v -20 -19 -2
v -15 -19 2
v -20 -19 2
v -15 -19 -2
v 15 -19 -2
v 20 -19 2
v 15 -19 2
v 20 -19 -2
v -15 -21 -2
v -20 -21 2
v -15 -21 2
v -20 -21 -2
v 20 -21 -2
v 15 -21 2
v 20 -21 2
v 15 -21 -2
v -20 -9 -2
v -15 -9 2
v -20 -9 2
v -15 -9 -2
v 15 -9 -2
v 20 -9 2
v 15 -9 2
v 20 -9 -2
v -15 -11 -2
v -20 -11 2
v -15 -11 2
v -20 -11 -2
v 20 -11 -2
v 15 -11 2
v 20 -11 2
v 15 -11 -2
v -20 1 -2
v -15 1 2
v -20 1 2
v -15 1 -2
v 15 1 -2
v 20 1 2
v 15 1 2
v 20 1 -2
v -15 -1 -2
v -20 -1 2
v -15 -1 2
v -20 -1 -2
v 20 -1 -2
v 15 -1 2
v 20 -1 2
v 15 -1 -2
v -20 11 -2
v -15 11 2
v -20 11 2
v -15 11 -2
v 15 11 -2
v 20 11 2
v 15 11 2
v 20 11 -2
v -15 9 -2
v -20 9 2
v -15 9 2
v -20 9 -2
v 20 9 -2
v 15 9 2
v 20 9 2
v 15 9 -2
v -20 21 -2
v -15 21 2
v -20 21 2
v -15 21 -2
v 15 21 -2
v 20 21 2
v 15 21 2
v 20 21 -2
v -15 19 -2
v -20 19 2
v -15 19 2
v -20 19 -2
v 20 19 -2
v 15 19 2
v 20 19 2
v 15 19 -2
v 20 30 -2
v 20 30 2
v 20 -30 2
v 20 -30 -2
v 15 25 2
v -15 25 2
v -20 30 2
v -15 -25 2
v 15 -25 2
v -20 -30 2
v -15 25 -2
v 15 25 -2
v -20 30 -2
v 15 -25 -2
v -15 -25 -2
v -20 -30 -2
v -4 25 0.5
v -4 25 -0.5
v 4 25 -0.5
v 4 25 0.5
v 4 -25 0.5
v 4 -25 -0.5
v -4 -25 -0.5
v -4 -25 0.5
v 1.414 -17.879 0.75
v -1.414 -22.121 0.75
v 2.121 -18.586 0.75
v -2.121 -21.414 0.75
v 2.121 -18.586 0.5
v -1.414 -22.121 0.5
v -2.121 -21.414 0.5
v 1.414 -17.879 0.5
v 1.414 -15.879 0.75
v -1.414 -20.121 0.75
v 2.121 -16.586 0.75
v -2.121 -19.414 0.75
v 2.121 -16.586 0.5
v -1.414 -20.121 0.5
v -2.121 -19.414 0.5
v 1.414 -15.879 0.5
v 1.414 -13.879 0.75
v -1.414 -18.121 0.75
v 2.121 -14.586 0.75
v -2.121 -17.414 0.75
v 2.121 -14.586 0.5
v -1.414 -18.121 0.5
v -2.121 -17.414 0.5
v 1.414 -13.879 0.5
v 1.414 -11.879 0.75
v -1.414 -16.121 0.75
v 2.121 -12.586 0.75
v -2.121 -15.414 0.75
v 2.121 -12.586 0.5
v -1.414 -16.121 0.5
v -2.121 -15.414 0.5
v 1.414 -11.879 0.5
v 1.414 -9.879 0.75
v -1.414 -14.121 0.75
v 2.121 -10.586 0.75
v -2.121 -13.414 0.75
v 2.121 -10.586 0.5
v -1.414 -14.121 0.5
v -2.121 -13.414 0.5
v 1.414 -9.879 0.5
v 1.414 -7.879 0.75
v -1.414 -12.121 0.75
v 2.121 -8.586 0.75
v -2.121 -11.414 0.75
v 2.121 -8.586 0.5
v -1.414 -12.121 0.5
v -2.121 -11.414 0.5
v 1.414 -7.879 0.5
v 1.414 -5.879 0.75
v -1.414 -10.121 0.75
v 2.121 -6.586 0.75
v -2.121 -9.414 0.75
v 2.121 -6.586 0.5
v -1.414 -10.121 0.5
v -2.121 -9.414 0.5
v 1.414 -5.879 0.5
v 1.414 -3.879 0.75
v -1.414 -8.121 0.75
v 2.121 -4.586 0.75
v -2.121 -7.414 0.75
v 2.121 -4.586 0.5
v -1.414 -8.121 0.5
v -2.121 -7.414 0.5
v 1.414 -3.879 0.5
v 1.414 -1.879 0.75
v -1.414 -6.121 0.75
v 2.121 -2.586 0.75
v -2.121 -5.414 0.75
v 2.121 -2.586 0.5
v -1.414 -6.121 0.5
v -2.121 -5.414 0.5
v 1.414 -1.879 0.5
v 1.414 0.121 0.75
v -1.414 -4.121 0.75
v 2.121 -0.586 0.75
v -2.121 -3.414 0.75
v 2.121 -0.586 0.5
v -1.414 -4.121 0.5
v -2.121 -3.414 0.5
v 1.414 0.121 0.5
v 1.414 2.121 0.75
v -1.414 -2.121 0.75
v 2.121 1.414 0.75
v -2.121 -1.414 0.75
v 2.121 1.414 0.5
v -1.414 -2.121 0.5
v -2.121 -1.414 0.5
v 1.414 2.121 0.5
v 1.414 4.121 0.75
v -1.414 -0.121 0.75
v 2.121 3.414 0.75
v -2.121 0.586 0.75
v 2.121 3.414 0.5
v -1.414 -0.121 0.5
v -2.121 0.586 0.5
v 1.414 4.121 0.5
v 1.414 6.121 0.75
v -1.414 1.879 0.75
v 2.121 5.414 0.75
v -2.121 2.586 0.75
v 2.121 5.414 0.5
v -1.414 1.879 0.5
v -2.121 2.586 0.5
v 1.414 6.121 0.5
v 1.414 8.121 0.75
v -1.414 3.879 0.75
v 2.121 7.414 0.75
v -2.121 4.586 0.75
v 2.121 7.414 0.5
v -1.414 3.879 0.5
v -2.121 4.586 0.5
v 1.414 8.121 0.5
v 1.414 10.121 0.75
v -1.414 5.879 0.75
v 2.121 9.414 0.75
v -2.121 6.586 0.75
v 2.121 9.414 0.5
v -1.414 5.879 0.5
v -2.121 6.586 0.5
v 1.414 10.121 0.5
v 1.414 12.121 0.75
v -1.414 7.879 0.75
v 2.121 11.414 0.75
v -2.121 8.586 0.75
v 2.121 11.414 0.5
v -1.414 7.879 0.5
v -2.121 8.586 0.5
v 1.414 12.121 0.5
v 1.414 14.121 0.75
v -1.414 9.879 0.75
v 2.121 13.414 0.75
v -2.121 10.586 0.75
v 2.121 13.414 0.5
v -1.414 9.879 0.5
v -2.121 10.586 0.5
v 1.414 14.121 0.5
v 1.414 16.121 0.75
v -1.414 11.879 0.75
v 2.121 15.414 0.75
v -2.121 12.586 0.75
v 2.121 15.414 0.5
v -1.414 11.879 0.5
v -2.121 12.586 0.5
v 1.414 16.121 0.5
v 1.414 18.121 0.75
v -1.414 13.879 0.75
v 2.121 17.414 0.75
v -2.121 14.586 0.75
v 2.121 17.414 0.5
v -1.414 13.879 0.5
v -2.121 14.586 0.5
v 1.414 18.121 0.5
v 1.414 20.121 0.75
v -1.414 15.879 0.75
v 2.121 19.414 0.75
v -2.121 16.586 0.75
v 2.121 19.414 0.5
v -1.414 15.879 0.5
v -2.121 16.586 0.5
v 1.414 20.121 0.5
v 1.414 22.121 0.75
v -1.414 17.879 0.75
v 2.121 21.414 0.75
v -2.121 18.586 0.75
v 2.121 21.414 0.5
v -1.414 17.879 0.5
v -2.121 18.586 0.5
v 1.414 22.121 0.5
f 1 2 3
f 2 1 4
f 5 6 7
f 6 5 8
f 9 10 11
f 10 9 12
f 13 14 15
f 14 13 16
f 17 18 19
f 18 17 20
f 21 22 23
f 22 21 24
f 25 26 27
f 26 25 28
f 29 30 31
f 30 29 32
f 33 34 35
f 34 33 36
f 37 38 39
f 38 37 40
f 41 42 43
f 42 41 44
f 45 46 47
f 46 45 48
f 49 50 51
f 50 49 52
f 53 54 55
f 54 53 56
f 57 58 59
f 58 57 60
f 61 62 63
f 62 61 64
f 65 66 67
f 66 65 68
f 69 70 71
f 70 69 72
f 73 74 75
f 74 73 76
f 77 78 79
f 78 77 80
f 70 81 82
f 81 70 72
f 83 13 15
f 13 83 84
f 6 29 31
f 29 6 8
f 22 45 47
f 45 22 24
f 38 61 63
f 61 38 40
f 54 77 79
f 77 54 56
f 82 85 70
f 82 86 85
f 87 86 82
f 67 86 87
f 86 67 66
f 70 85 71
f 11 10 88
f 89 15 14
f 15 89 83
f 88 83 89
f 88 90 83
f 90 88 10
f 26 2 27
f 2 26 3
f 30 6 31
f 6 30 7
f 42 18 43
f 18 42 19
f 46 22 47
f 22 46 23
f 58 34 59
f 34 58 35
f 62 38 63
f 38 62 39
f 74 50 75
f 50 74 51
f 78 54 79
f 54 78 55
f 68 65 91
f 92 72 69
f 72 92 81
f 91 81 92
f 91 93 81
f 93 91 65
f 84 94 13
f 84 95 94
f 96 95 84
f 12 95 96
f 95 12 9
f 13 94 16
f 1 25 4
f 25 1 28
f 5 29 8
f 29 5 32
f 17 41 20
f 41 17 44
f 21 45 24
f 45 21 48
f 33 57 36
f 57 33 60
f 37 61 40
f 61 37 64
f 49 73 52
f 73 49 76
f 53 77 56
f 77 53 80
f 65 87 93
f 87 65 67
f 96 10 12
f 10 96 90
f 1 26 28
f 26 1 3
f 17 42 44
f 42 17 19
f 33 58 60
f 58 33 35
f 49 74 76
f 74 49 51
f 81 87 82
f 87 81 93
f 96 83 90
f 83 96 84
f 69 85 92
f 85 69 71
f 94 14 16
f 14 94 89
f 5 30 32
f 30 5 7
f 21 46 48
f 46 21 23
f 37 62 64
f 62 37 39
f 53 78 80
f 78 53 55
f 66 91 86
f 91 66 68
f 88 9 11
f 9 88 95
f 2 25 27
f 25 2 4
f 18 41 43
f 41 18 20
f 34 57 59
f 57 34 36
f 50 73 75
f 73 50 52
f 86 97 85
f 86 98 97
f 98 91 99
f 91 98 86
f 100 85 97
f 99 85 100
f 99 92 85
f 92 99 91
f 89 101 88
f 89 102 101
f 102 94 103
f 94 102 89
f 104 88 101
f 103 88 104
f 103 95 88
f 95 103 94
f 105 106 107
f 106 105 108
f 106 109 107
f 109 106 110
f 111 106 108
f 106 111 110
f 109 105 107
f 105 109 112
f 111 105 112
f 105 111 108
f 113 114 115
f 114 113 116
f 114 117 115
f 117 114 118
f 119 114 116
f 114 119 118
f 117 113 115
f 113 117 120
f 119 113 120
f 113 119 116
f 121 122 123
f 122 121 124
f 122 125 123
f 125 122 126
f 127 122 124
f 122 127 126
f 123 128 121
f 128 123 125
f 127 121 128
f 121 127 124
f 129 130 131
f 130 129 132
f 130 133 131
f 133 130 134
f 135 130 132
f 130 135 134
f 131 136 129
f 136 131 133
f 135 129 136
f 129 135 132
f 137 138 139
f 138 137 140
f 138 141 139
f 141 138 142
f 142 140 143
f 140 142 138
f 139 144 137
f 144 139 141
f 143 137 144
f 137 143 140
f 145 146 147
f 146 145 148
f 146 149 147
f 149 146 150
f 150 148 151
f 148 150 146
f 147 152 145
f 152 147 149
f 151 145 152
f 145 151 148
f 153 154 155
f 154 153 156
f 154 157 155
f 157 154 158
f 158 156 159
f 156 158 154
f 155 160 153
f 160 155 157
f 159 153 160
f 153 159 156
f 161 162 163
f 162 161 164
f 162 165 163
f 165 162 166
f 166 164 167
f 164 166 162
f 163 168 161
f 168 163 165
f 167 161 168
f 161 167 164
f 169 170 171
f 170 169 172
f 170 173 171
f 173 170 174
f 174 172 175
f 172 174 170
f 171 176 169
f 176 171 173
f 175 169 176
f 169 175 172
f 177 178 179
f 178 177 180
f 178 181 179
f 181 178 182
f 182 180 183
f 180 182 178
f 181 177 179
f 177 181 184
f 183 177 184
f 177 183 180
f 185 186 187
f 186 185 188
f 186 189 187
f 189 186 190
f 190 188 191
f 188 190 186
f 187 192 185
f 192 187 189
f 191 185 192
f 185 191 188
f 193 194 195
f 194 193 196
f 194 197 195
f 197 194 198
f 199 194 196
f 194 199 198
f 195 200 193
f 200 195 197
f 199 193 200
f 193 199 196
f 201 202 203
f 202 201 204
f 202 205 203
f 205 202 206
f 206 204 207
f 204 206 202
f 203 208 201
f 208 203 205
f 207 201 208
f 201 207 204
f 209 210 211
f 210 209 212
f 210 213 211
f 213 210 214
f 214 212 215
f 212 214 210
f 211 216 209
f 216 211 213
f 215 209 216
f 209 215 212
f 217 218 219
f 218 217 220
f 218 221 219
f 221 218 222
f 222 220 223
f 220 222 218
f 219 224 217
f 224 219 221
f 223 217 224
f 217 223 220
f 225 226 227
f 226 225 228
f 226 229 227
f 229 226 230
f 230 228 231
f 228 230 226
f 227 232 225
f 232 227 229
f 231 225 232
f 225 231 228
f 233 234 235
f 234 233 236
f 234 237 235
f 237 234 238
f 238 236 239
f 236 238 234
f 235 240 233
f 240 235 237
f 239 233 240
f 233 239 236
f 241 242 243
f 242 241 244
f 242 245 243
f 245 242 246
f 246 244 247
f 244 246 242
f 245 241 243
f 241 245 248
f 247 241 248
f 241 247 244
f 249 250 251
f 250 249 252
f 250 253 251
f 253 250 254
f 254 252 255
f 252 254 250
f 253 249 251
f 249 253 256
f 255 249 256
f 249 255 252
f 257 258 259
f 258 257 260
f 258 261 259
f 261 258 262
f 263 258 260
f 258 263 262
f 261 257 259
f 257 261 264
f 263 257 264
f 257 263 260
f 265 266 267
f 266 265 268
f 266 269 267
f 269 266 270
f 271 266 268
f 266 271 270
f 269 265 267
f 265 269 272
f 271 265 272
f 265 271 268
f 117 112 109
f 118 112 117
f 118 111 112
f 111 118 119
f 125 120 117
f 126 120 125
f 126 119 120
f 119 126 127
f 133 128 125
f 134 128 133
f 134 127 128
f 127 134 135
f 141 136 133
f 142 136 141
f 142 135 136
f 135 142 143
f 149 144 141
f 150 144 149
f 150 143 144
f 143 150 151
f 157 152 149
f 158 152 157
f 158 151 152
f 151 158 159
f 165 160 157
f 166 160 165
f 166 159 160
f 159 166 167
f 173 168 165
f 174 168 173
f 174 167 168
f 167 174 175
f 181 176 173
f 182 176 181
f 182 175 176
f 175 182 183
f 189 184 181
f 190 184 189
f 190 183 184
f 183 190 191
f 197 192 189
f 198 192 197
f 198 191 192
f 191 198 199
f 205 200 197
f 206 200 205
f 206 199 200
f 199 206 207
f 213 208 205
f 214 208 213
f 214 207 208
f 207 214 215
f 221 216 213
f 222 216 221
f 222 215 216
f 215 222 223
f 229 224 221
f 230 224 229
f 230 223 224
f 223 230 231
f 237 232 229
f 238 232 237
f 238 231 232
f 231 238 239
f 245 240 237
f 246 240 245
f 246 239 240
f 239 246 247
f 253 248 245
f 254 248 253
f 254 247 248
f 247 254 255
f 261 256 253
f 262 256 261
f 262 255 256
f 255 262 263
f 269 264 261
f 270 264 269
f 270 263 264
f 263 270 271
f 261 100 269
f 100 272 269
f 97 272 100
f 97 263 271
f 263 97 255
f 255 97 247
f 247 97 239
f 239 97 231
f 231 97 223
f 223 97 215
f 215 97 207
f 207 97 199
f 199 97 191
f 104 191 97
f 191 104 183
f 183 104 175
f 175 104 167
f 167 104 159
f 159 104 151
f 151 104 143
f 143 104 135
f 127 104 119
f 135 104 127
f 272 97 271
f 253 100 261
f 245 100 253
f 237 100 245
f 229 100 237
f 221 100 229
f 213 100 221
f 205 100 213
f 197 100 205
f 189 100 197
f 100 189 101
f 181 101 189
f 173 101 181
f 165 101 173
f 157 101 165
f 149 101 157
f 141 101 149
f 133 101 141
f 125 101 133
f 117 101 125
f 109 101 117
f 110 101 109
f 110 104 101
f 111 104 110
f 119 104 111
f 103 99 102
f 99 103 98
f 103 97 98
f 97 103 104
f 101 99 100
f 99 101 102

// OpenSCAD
/* KOKOMO ART ASSOCIATION - GENERATIVE OBJECTS
   Generated: 2026-02-13
   Design ID: 22
   
   INSTRUCTIONS:
   1. Save as "kaa_design.scad"
   2. Ensure "logo.svg" is in the same folder (if using logo)
   3. Open in OpenSCAD -> F6 -> Export STL
*/

// --- USER CONFIGURATION ---
design_id = 22;
top_text = "KOKOMO ART ASSOCIATION";
bottom_text = "kaaonline.org";
use_logo = false;
logo_file = "logo.svg";

// [POCKET ORBIT CONFIG]
// 0 = River-Stone Minimal | 1 = Art Deco Notchwork | 2 = Bloom Drift
design_style = 1; 
render_mode = "assembled"; // "assembled" or "knolled"

// --- GLOBAL PARAMETERS ---
card_width = 85;
card_length = 55;
corner_radius = 3;
tol = 0.4; // Tolerance
$fn = 60;  // Resolution

// --- SHARED MODULES ---

module card_base(thickness) {
    hull() {
        translate([corner_radius, corner_radius, 0]) cylinder(r=corner_radius, h=thickness);
        translate([card_width-corner_radius, corner_radius, 0]) cylinder(r=corner_radius, h=thickness);
        translate([card_width-corner_radius, card_length-corner_radius, 0]) cylinder(r=corner_radius, h=thickness);
        translate([corner_radius, card_length-corner_radius, 0]) cylinder(r=corner_radius, h=thickness);
    }
}

module rounded_square(w, l, r) {
    hull() {
        translate([r, r]) circle(r=r);
        translate([w-r, r]) circle(r=r);
        translate([w-r, l-r]) circle(r=r);
        translate([r, l-r]) circle(r=r);
    }
}

module branding_text(thickness) {
    if (top_text != "") {
        translate([card_width/2, card_length - 8, thickness - 0.4])
            linear_extrude(0.8) text(top_text, size=4, halign="center", valign="center", font="Arial:style=Bold");
    }
    if (bottom_text != "") {
        translate([card_width/2, 8, thickness - 0.4])
            linear_extrude(0.8) text(bottom_text, size=3, halign="center", valign="center", font="Arial");
    }
}

module place_logo(thickness) {
    if (use_logo) {
        translate([card_width/2, card_length/2, thickness - 0.6])
            linear_extrude(1.0)
            scale([0.3, 0.3, 1]) 
            import(logo_file, center=true);
    }
}

module v_track_cutout(x_start, y_center, x_len, y_width, z_thick) {
    translate([x_start, y_center, 0])
    hull() {
        translate([0, -y_width/2, -0.1]) cube([x_len, y_width, 0.1]);
        translate([0, -(y_width + 2)/2, z_thick/2 - 0.1]) cube([x_len, y_width + 2, 0.2]);
        translate([0, -y_width/2, z_thick]) cube([x_len, y_width, 0.1]);
    }
}

module v_track_slider(x_start, y_center, x_len, y_width, z_thick) {
    w1 = y_width - (2 * tol);
    w2 = (y_width + 2) - (2 * tol);
    translate([x_start, y_center, 0])
    hull() {
        translate([0, -w1/2, 0]) cube([x_len, w1, 0.1]);
        translate([0, -w2/2, z_thick/2 - 0.1]) cube([x_len, w2, 0.2]);
        translate([0, -w1/2, z_thick - 0.1]) cube([x_len, w1, 0.1]);
    }
}

// --- CARD DESIGNS (1-14) ---

module pulse_dots() {
    th = 0.8;
    difference() {
        card_base(th);
        if (top_text != "") translate([10, card_length-12, -1]) cube([65, 10, th+2]);
        if (bottom_text != "") translate([10, 2, -1]) cube([65, 10, th+2]);
    }
    branding_text(th);
    place_logo(th);
    for (x = [4 : 3.5 : card_width-4]) {
        for (y = [12 : 3.5 : card_length-12]) {
            h_add = 0.6 + (0.4 * sin(x*25)) + (0.3 * cos(y*30));
            translate([x, y, th - 0.2]) scale([1, 1, h_add/1.5]) sphere(r=1.5, $fn=20);
        }
    }
}

module breathe_lines() {
    th = 0.8;
    card_base(th);
    branding_text(th);
    intersection() {
        translate([0,0,th]) linear_extrude(2) rounded_square(card_width, card_length, corner_radius);
        union() {
            for (x = [6 : 4 : card_width-4]) {
                translate([x, 0, th]) rotate([-90, 0, 0]) scale([1, 0.6, 1]) cylinder(r=2, h=card_length);
            }
        }
    }
}

module micro_labyrinth() {
    th = 0.8;
    card_base(th);
    branding_text(th);
    path_width = 1.5; wall_thick = 1.5;
    intersection() {
        translate([0,0,th]) linear_extrude(2) rounded_square(card_width, card_length, corner_radius);
        union() {
            for (i = [0 : 4]) {
                w = card_width - 12 - (i * (path_width + wall_thick)*2);
                l = card_length - 12 - (i * (path_width + wall_thick)*2);
                if (w > 10 && l > 10) {
                    difference() {
                        translate([card_width/2, card_length/2, th])
                            linear_extrude(1.2)
                            difference() {
                                rounded_square(w, l, 3);
                                translate([wall_thick, wall_thick, 0]) rounded_square(w-wall_thick*2, l-wall_thick*2, 1.5);
                            }
                        translate([card_width/2 + (i%2==0 ? w/3 : -w/3), card_length/2 + (i%2==0 ? l/2 : -l/2), th])
                            cube([6, 6, 5], center=true);
                    }
                }
            }
        }
    }
}

module quiet_tile() {
    th = 1.2;
    difference() {
        card_base(th);
        translate([card_width*0.75 - 13, card_length/2 - 13, -1]) linear_extrude(4) rounded_square(26, 26, 3);
    }
    branding_text(th);
    translate([card_width*0.75, card_length + 20, 0]) {
        difference() {
            translate([-12.5, -12.5, 0]) linear_extrude(2.5) rounded_square(25, 25, 2.5);
            translate([0, 0, 11]) sphere(r=9.5, $fn=100);
        }
    }
}

module orbit_slider() {
    th = 1.6;
    center_x = card_width * 0.75; center_y = card_length / 2; radius = 16; track_w = 4.5;
    difference() {
        card_base(th);
        translate([center_x, center_y, th/2])
            rotate_extrude()
                polygon(points=[[radius - track_w, -th/2 - 0.1], [radius, -th/2 - 0.1], [radius + 1.2, 0], [radius, th/2 + 0.1], [radius - track_w, th/2 + 0.1]]);
    }
    branding_text(th);
    translate([center_x, center_y, th/2])
        rotate_extrude()
            polygon(points=[[radius - track_w + tol, -th/2 + tol], [radius - tol, -th/2 + tol], [radius + 1.2 - tol*1.5, 0], [radius - tol, th/2 - tol], [radius - track_w + tol, th/2 - tol]]);
}

module viewfinder() {
    th = 1.2;
    difference() {
        card_base(th);
        translate([(card_width - 50)/2, (card_length - 31)/2, -1])
            hull() { r=2; translate([r,r,0]) cylinder(r=r,h=th+2); translate([50-r,r,0]) cylinder(r=r,h=th+2); translate([50-r,31-r,0]) cylinder(r=r,h=th+2); translate([r,31-r,0]) cylinder(r=r,h=th+2); }
        translate([card_width - 6, card_length - 6, -1]) cylinder(r=2, h=th+2);
    }
    branding_text(th);
}

module curator_gauge() {
    th = 1.2;
    difference() {
        card_base(th);
        translate([10, -1, -1]) cube([5, 12, th+2]);
        translate([25, -1, -1]) cube([10, 15, th+2]);
        translate([45, -1, -1]) cube([15, 18, th+2]);
        translate([70, -1, -1]) cube([20, 20, th+2]);
        for (i = [0 : 80]) {
            tl = (i % 10 == 0) ? 4 : ((i % 5 == 0) ? 2.5 : 1.5);
            tw = (i % 10 == 0) ? 0.6 : 0.4;
            translate([2.5 + i, card_length - tl, th - 0.4]) cube([tw, tl + 1, 1]);
        }
    }
    branding_text(th);
}

module french_curve() {
    th = 1.2;
    difference() {
        hull() {
            translate([corner_radius, corner_radius, 0]) cylinder(r=corner_radius, h=th);
            translate([card_width-corner_radius, corner_radius, 0]) cylinder(r=corner_radius, h=th);
            translate([corner_radius, card_length - 15, 0]) cylinder(r=corner_radius, h=th);
            translate([card_width*0.3, card_length - 5, 0]) cylinder(r=15, h=th);
            translate([card_width*0.7, card_length - 25, 0]) cylinder(r=8, h=th);
            translate([card_width-corner_radius, corner_radius*3, 0]) cylinder(r=corner_radius, h=th);
        }
        translate([20, 20, -1]) cylinder(r=7.5, h=th+2);
        translate([38, 14, -1]) hull() { r=1; translate([r,r,0]) cylinder(r=r,h=th+2); translate([12-r,12-r,0]) cylinder(r=r,h=th+2); } 
    }
    branding_text(th);
}

module portfolio_clip() {
    th = 1.2;
    difference() {
        card_base(th);
        translate([15, 15, -1]) linear_extrude(th + 2) {
             hull() { translate([0, 0, 0]) circle(d=3); translate([55, 0, 0]) circle(d=3); }
             hull() { translate([55, 0, 0]) circle(d=3); translate([55, 25, 0]) circle(d=3); }
             hull() { translate([55, 25, 0]) circle(d=3); translate([5, 25, 0]) circle(d=3); }
             // Simplified loop for brevity
        }
    }
    branding_text(th);
}

module micro_easel() {
    th = 1.2; hinge = 0.4;
    difference() {
        card_base(th);
        translate([20, 10, -1]) linear_extrude(th + 2) polygon(points=[[0,0], [45,0], [45,30], [0,30]]);
        translate([20, 40, hinge]) cube([45, 1.5, th]);
    }
    branding_text(th);
}

module captive_slider() {
    th = 1.2;
    difference() {
        card_base(th);
        translate([15, 25, -1]) cube([55, 5, th + 2]);
        translate([12, 22.5, th/2 - 0.3]) cube([61, 10, 0.6]);
    }
    branding_text(th);
    translate([25, 25 + tol, 0]) cube([10, 5 - (tol*2), th]);
    translate([23, 23.5 + tol, th/2 - 0.15]) cube([14, 8 - (tol*2), 0.3]);
}

module aspect_cropper() {
    th = 2.0;
    difference() {
        card_base(th);
        translate([15, 18, -1]) cube([50, 30, th + 2]);
        v_track_cutout(12, 11, 56, 10, th);
    }
    branding_text(th);
    v_track_slider(14, 11, 12, 10, th);
    translate([20, 16, 0]) cube([6, 32, th]);
    translate([20, 42, 0]) cube([15, 6, th]);
}

module curator_selector() {
    th = 2.0;
    difference() {
        card_base(th);
        v_track_cutout(10, 27.5, 65, 18, th);
        translate([20, 27.5, th - 0.6]) linear_extrude(1) text("CREATE", size=4, halign="center", valign="center");
        translate([65, 27.5, th - 0.6]) linear_extrude(1) text("CONNECT", size=4, halign="center", valign="center");
    }
    branding_text(th);
    difference() {
        v_track_slider(12, 27.5, 22, 18, th);
        translate([20, 27.5, -1]) cylinder(r=5, h=th+2);
    }
}

module vault_doors() {
    th = 2.0;
    difference() {
        card_base(th);
        v_track_cutout(8, 27.5, 69, 25, th);
        translate([27.5, 15, 0.6]) cube([30, 25, th]);
    }
    branding_text(th);
    place_logo(th);
    difference() {
        v_track_slider(8, 27.5, 28, 25, th);
        translate([35, 27.5, -1]) cube([5, 10, th+2], center=true);
    }
    translate([12, 27.5, th/2]) scale([0.5, 1, 1]) sphere(r=5);
    union() {
        v_track_slider(49, 27.5, 28, 25, th);
        translate([47, 22.5, 0]) cube([3, 10, th - 0.2]); 
    }
    translate([73, 27.5, th/2]) scale([0.5, 1, 1]) sphere(r=5);
}

// --- POCKET ORBITS MODULES ---

module OrbitRingStack() {
    core_radius = 8; ring_thickness = 4; height = 12; tolerance = 0.4;
    module ring_shape(radius, w, h, style) {
        if (style == 0) { rotate_extrude() translate([radius + w/2, 0, 0]) resize([w, h]) circle(d=h); } 
        else if (style == 1) { 
            difference() {
                union() { cylinder(r=radius + w, h=h, center=true, $fn=80); for(i=[0:1]) translate([0,0,(i==0?1:-1)*(h/4)]) cylinder(r=radius + w + 0.5, h=1, center=true, $fn=80); }
                cylinder(r=radius, h=h+2, center=true, $fn=80);
                translate([0,0,h/2]) cylinder(r1=radius+w-1, r2=radius+w, h=1, center=false);
                rotate([180,0,0]) translate([0,0,h/2]) cylinder(r1=radius+w-1, r2=radius+w, h=1, center=false);
            }
        } else {
            difference() { cylinder(r=radius+w, h=h, center=true); cylinder(r=radius, h=h+2, center=true); }
            for(i=[0:30:360]) rotate([0,0,i]) translate([radius+w, 0, 0]) scale([1, 0.5, 1]) sphere(r=h/2.5);
        }
    }
    module core(style) {
        if (style == 0) hull() { translate([0,0,height/2 - 2]) sphere(r=core_radius); translate([0,0,-(height/2 - 2)]) sphere(r=core_radius); }
        else if (style == 1) cylinder(r=core_radius, h=height, center=true, $fn=6);
        else { cylinder(r=core_radius, h=height, center=true); translate([0,0,height/2]) sphere(r=core_radius); translate([0,0,-height/2]) sphere(r=core_radius); }
    }
    translate([0, 0, 0]) core(design_style);
    translate([(render_mode=="knolled"? core_radius*3.5 : 0), 0, 0]) ring_shape(core_radius + tolerance, ring_thickness, height*0.8, design_style);
    translate([(render_mode=="knolled"? core_radius*7 : 0), 0, 0]) ring_shape(core_radius + ring_thickness + (tolerance*2), ring_thickness, height*0.6, design_style);
    translate([(render_mode=="knolled"? core_radius*10.5 : 0), 0, 0]) ring_shape(core_radius + (ring_thickness*2) + (tolerance*3), ring_thickness, height*0.4, design_style);
}

module SilentHinge() {
    width = 30; length = 40; height = 12;
    module shell_half(style, is_top) {
        difference() {
            if (style == 0) hull() { translate([0, 10, 0]) sphere(d=width); translate([0, -10, 0]) sphere(d=width); }
            else if (style == 1) union() { cube([width, length, height/2], center=true); translate([0,0,1]) cube([width-4, length-4, height/2], center=true); }
            else intersection() { translate([0, -10, 0]) scale([1, 1.5, 1]) sphere(d=width*1.2); translate([0, 10, 0]) scale([1, 1.5, 1]) sphere(d=width*1.2); }
            translate([0,0, (is_top?-2:2)]) scale([0.8, 0.8, 0.8]) 
                if(style==0) hull() { translate([0,10,0]) sphere(d=width); translate([0,-10,0]) sphere(d=width); }
                else if(style==1) cube([width, length, height/2], center=true);
                else intersection() { translate([0,-10,0]) scale([1,1.5,1]) sphere(d=width*1.2); translate([0,10,0]) scale([1,1.5,1]) sphere(d=width*1.2); }
            translate([0, -length/2, 0]) cube([10, 2, 4], center=true); 
            translate([width/3, length/3, 0]) cylinder(r=1, h=10, center=true);
            translate([-width/3, length/3, 0]) cylinder(r=1, h=10, center=true);
        }
    }
    if (render_mode == "assembled") {
        translate([0,0,height/4]) shell_half(design_style, true);
        translate([0,0,-height/4]) rotate([180,0,0]) shell_half(design_style, false);
    } else {
        translate([-width, 0, 0]) rotate([0,180,0]) shell_half(design_style, true);
        translate([width, 0, 0]) shell_half(design_style, false);
        translate([0, -length, 0]) color("black") cube([8, 10, 0.8], center=true);
    }
}

module DetentSlider() {
    width = 25; slider_len = 50; height = 12;
    module base_shape(style) {
        if (style == 0) hull() { translate([-(slider_len/2)+width/2, 0, 0]) sphere(d=width); translate([(slider_len/2)-width/2, 0, 0]) sphere(d=width); }
        else if (style == 1) intersection() { cube([slider_len, width, height/1.5], center=true); rotate([0,90,0]) cylinder(r=width/1.8, h=slider_len, center=true, $fn=6); }
        else intersection() { scale([2, 1, 0.6]) sphere(d=width*1.5); cube([slider_len*1.2, width, height], center=true); }
    }
    module slider_button(style) {
        union() {
            translate([0,0,height/2]) 
                if (style == 0) scale([1, 1, 0.5]) sphere(d=10);
                else if (style == 1) cylinder(r=5, h=4, $fn=8);
                else sphere(d=8);
            translate([0,0,2]) cylinder(r=2.5, h=height/2);
            translate([0,0,0]) cube([8, 5, 2], center=true);
        }
    }
    y_off = (render_mode == "knolled") ? 30 : 0;
    z_slider = (render_mode == "knolled") ? 0 : 1;
    difference() {
        base_shape(design_style);
        hull() { translate([-10, 0, 2]) cylinder(r=3, h=10, center=true); translate([10, 0, 2]) cylinder(r=3, h=10, center=true); }
    }
    translate([0, y_off, z_slider]) slider_button(design_style);
}

module MazeCoin() {
    diameter = 40; thickness = 6;
    module groove_pattern(style) {
        if (style == 0) rotate_extrude() translate([diameter/2 - 8, 0, 0]) circle(r=2);
        else if (style == 1) for(i=[0:90:360]) rotate([0,0,i]) { translate([10,0,0]) cube([15, 2, 2], center=true); translate([15,5,0]) rotate([0,0,90]) cube([10, 2, 2], center=true); }
        else linear_extrude(height=2, twist=300, scale=0) translate([5,0,0]) circle(r=2);
    }
    module coin_half(style, is_male) {
        difference() {
            cylinder(r=diameter/2, h=thickness, center=true);
            translate([0,0,thickness/2]) groove_pattern(style);
            if (!is_male) { cylinder(r=5, h=thickness+2, center=true); translate([0,0,-2]) cube([12, 4, 4], center=true); }
        }
        if (is_male) translate([0,0,-thickness/2 - 1]) union() { cylinder(r=4.8, h=2, center=true); cube([11, 3.8, 2], center=true); }
    }
    if (render_mode == "assembled") {
        translate([0,0,thickness/2]) coin_half(design_style, true);
        translate([0,0,-thickness/2]) rotate([180,0,0]) coin_half(design_style, false);
    } else {
        translate([-diameter/1.2, 0, 0]) coin_half(design_style, true);
        translate([diameter/1.2, 0, 0]) rotate([180,0,0]) coin_half(design_style, false);
    }
}

module RosaryKeychain() {
    module bead(style, seed) {
        difference() {
            if (style == 0) { sphere(d=10); if (seed > 2) for(i=[0:45:360]) rotate([i,0,0]) translate([0,5,0]) sphere(r=0.5); }
            else if (style == 1) { rotate([0,90,0]) cylinder(r=5, h=10, center=true, $fn=6); if (seed > 2) rotate([0,90,0]) cylinder(r=5.5, h=8, center=true, $fn=6); }
            else hull() { translate([-3,0,0]) sphere(r=3); translate([3,0,0]) sphere(r=3); translate([0,4,0]) sphere(r=2); }
            rotate([0,90,0]) cylinder(r=1.5, h=15, center=true);
        }
    }
    module clasp(style) { if (style == 1) cube([12, 6, 4], center=true); else hull() { translate([-4,0,0]) circle(d=4); translate([4,0,0]) circle(d=4); } }
    if (render_mode == "knolled") {
        for(i=[0:6]) translate([i*15, 0, 0]) bead(design_style, i);
        translate([-15, 0, 0]) clasp(design_style);
    } else {
        for(i=[0:45:315]) rotate([0,0,i]) translate([18, 0, 0]) rotate([0,0,90]) bead(design_style, i/45);
        translate([18, 0, 0]) clasp(design_style);
    }
}

module FlipToken() {
    module frame(style) {
        difference() {
            if (style == 0) hull() { translate([-10, 0, 0]) sphere(d=12); translate([10, 0, 0]) sphere(d=12); }
            else if (style == 1) difference() { cube([30, 15, 8], center=true); rotate([0,90,0]) cylinder(r=5, h=32, center=true, $fn=4); }
            else { intersection() { translate([-5,0,0]) circle(r=20); translate([5,0,0]) circle(r=20); } linear_extrude(8, center=true) children(); }
            cube([16, 8, 20], center=true); 
            rotate([90,0,0]) cylinder(r=1.5, h=20, center=true); 
        }
    }
    module tile(style) {
        difference() {
            if (style == 0) cube([14, 6, 14], center=true);
            else if (style == 1) union() { cube([14, 6, 14], center=true); cube([10, 7, 10], center=true); }
            else intersection() { scale([1, 0.4, 1]) sphere(d=15); cube([14, 6, 14], center=true); }
            rotate([90,0,0]) cylinder(r=1.6, h=20, center=true);
        }
    }
    y_off = (render_mode == "knolled") ? 20 : 0;
    frame(design_style);
    translate([0, y_off, 0]) rotate([(render_mode=="knolled"?90:0), 0, 0]) tile(design_style);
    translate([0, y_off*2, 0]) rotate([90,0,0]) cylinder(r=1.4, h=16, center=true);
}

module SpiralTwister() {
    module shell(style, is_inner) {
        sc = is_inner ? 0.8 : 1.0;
        fn_val = (style == 1) ? 4 : 60;
        scale([sc, sc, sc]) difference() {
            union() {
                linear_extrude(height=20, twist=120, scale=0.1, slices=50) circle(r=10, $fn=fn_val);
                rotate([180,0,0]) linear_extrude(height=20, twist=120, scale=0.1, slices=50) circle(r=10, $fn=fn_val);
            }
        }
    }
    module lock() { difference() { cylinder(r=8, h=2, center=true); cylinder(r=6, h=4, center=true); } }
    if (render_mode == "assembled") {
        shell(design_style, false);
    } else {
        translate([-15, 0, 0]) shell(design_style, false);
        translate([15, 0, 0]) shell(design_style, true);
        translate([0, -20, 0]) lock();
    }
}

module TactileLoom() {
    fw = 40; fh = 60; th = 4;
    module frame_shape(style) {
        difference() {
            if (style == 0) resize([fw, fh, th]) sphere(d=fw);
            else if (style == 1) cube([fw, fh, th], center=true);
            else intersection() { translate([-fw/2, 0, 0]) scale([1, 1.5, 1]) sphere(d=fw*2); translate([fw/2, 0, 0]) scale([1, 1.5, 1]) sphere(d=fw*2); }
            if (style == 0) resize([fw-10, fh-10, th+2]) cylinder(d=10);
            else if (style == 1) cube([fw-10, fh-10, th+2], center=true);
            else resize([fw-15, fh-20, th+2]) cylinder(d=10);
            for(i=[-20:10:20]) translate([0, i, 0]) cube([fw+5, 2, th+5], center=true);
        }
    }
    module strip(style) {
        cube([fw + 20, 8, 1], center=true);
        for(i=[-20:2:20]) translate([i, 0, 0.5]) if(style==1) rotate([0,0,45]) cube([1,5,0.5], center=true); else cylinder(r=0.5, h=1, center=true);
    }
    if (render_mode == "assembled") {
        frame_shape(design_style);
        color("gray") rotate([0,0,90]) strip(design_style);
    } else {
        translate([-30, 0, 0]) frame_shape(design_style);
        translate([30, 0, 0]) rotate([0,0,90]) strip(design_style);
        translate([45, 0, 0]) rotate([0,0,90]) strip(design_style);
    }
}

// --- RENDER LOGIC ---
if (design_id == 1) pulse_dots();
if (design_id == 2) breathe_lines();
if (design_id == 3) micro_labyrinth();
if (design_id == 4) quiet_tile();
if (design_id == 5) orbit_slider();
if (design_id == 6) viewfinder();
if (design_id == 7) curator_gauge();
if (design_id == 8) french_curve();
if (design_id == 9) portfolio_clip();
if (design_id == 10) micro_easel();
if (design_id == 11) captive_slider();
if (design_id == 12) aspect_cropper();
if (design_id == 13) curator_selector();
if (design_id == 14) vault_doors();

if (design_id == 15) OrbitRingStack();
if (design_id == 16) SilentHinge();
if (design_id == 17) DetentSlider();
if (design_id == 18) MazeCoin();
if (design_id == 19) RosaryKeychain();
if (design_id == 20) FlipToken();
if (design_id == 21) SpiralTwister();
if (design_id == 22) TactileLoom();
